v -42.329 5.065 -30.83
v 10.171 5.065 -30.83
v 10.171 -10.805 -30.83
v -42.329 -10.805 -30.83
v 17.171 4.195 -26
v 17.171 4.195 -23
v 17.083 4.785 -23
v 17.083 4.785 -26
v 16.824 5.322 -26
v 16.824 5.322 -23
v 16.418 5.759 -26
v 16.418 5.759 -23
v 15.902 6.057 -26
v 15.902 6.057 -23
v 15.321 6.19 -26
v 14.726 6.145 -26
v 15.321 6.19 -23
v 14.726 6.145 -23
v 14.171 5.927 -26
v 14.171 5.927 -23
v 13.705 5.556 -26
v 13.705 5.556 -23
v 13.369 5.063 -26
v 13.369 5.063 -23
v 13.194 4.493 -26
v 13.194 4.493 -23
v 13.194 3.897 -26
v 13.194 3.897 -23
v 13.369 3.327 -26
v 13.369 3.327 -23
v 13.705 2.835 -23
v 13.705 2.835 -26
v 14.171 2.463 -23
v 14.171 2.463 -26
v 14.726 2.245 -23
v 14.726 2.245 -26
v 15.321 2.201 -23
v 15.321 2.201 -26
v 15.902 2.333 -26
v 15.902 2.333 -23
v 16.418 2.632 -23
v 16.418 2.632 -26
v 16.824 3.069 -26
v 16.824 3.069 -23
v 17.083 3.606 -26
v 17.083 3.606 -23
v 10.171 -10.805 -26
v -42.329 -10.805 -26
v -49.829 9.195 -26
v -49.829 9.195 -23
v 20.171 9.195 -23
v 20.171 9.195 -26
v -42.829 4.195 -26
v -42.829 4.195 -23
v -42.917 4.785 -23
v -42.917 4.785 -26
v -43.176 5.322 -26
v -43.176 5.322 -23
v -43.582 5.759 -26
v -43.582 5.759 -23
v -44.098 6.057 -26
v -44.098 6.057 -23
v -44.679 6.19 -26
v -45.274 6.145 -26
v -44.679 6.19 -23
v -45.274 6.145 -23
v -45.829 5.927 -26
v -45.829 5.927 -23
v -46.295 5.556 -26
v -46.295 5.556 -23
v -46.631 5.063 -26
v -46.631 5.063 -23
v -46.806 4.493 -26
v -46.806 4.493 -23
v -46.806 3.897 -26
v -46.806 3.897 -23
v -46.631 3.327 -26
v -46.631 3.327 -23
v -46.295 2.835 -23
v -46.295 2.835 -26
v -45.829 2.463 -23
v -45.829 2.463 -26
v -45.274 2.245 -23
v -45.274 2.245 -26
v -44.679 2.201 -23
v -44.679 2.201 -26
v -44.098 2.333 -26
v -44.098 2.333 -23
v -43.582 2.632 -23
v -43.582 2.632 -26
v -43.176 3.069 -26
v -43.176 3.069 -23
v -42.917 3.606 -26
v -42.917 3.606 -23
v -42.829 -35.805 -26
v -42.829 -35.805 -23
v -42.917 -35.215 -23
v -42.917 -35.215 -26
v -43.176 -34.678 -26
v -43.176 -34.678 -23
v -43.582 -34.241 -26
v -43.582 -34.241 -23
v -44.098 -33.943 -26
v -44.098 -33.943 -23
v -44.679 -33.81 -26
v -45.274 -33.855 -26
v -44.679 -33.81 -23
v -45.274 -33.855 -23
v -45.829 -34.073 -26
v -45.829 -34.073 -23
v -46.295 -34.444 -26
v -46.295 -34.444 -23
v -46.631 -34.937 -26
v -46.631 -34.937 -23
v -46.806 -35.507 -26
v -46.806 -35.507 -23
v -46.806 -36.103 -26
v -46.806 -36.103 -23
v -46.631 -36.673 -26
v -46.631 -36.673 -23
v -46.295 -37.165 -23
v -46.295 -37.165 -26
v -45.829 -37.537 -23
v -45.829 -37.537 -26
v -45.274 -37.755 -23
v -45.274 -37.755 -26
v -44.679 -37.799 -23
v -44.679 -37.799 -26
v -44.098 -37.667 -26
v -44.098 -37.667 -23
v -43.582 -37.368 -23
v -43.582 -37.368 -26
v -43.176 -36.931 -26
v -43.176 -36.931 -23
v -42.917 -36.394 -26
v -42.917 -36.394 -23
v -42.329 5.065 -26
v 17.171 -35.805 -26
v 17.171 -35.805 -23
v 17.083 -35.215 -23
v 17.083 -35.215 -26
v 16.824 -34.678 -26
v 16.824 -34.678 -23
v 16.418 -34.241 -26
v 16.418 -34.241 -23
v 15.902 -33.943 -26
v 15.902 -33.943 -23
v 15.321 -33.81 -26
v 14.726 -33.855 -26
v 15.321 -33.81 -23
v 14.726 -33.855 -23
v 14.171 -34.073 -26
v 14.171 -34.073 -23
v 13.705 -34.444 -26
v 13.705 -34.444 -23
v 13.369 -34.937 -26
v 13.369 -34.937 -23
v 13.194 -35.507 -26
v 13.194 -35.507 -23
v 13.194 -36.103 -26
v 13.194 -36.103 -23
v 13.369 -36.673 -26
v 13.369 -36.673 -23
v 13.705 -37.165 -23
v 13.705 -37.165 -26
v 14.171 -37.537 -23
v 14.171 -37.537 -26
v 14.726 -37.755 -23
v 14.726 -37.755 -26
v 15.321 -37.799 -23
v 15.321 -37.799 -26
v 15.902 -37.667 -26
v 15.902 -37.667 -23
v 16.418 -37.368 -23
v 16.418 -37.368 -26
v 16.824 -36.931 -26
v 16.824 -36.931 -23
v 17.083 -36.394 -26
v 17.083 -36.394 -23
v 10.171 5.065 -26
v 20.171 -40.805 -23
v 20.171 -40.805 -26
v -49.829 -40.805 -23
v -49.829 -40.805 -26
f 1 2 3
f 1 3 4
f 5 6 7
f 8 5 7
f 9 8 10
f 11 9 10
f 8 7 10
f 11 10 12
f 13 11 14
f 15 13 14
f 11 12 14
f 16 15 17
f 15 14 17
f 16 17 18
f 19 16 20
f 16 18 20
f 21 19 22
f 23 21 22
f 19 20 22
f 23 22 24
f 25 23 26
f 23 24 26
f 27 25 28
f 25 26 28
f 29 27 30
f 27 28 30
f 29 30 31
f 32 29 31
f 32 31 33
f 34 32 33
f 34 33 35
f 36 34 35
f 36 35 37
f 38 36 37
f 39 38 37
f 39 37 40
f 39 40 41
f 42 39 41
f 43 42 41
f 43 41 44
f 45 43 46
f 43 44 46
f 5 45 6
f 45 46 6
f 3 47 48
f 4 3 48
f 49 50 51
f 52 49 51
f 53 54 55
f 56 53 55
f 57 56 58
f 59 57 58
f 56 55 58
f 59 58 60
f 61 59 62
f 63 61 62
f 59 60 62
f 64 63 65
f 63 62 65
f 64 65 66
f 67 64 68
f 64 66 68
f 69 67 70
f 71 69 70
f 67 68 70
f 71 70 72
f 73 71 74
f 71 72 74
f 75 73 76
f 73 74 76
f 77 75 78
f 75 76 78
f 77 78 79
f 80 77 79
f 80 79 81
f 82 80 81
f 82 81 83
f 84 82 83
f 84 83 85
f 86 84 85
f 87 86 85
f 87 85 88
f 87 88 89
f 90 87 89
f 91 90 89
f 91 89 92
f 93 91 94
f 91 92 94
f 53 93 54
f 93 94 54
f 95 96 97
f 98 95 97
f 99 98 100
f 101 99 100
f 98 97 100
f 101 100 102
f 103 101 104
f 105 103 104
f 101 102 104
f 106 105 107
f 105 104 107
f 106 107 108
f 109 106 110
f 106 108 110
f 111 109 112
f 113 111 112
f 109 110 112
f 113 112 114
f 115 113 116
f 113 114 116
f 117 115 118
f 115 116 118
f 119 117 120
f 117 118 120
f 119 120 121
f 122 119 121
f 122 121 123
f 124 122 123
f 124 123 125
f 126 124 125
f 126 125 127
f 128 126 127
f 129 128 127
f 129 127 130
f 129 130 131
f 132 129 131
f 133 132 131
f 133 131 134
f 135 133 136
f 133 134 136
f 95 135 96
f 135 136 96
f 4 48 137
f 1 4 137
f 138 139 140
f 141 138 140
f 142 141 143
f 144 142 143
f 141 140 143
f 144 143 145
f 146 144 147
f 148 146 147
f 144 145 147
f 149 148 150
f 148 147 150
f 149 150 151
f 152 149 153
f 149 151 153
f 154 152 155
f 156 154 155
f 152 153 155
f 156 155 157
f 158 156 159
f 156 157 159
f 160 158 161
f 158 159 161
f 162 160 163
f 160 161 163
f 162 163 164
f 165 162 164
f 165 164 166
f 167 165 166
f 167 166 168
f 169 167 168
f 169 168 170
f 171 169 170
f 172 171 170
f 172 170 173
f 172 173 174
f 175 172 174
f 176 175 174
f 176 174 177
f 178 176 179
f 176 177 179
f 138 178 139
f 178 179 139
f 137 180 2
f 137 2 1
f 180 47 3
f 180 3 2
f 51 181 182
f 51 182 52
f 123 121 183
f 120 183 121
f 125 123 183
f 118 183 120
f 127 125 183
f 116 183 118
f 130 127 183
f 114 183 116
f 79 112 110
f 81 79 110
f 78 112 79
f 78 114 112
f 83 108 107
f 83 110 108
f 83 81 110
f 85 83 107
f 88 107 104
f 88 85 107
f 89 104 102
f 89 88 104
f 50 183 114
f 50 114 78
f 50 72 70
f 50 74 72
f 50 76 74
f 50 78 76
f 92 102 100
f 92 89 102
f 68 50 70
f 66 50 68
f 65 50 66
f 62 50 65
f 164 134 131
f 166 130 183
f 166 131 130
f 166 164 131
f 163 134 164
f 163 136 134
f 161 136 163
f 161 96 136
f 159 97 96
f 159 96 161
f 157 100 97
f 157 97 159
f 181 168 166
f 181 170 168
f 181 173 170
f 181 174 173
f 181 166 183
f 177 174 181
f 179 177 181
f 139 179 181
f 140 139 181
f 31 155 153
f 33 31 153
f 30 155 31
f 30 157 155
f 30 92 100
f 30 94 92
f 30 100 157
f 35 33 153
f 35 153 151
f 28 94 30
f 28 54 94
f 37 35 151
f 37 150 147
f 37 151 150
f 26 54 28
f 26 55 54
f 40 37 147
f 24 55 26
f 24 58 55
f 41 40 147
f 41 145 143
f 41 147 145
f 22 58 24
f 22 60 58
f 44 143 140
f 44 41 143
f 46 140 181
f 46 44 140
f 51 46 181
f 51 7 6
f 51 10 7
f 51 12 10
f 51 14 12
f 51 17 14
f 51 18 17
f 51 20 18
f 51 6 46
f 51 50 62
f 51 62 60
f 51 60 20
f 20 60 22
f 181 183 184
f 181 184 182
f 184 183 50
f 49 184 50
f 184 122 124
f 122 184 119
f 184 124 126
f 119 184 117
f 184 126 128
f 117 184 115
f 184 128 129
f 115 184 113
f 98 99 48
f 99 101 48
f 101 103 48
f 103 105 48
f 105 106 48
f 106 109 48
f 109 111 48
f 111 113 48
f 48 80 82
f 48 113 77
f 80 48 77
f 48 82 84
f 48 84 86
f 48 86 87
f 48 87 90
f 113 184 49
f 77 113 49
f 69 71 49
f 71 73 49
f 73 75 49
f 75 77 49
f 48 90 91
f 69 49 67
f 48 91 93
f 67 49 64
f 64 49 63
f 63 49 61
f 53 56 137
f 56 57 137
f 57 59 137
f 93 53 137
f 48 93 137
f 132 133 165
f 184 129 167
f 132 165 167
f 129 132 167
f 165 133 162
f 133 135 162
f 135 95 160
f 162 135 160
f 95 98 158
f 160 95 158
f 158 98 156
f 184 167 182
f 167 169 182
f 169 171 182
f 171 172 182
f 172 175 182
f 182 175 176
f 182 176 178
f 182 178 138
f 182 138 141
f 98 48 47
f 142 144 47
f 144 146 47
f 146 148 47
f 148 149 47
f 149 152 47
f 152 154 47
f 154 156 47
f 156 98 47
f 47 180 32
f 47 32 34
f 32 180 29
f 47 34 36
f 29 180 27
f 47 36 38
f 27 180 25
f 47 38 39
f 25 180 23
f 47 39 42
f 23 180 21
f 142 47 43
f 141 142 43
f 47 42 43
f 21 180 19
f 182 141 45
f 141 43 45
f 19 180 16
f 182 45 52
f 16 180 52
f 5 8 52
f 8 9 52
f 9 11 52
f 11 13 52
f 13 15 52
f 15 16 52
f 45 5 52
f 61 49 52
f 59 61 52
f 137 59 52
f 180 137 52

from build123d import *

# Parameters (mm, degrees)
SKETCH1_W           = 70
SKETCH1_H           = 50
SKETCH1_R           = 2
BOSS_EXTRUDE1_DEPTH = 3
SKETCH2_W           = 52.5
SKETCH2_H           = 15.87
BOSS_EXTRUDE2_DEPTH = 4.83


with BuildPart() as part:
    # Sketch1 → Boss-Extrude1 (new body)
    with BuildSketch(Plane.XY.offset(-23)):
        with Locations((-14.828582329, -15.804770786)):
            Rectangle(SKETCH1_W, SKETCH1_H)
        with Locations((15.171417671, -35.804770786)):
            Circle(SKETCH1_R, mode=Mode.SUBTRACT)
        with Locations((-44.828582329, -35.804770786)):
            Circle(SKETCH1_R, mode=Mode.SUBTRACT)
        with Locations((-44.828582329, 4.195229214)):
            Circle(SKETCH1_R, mode=Mode.SUBTRACT)
        with Locations((15.171417671, 4.195229214)):
            Circle(SKETCH1_R, mode=Mode.SUBTRACT)
    extrude(amount=-BOSS_EXTRUDE1_DEPTH)

    # Sketch2 → Boss-Extrude2 (add)
    with BuildSketch(Plane(origin=(0, 0, -26), x_dir=(-1, 0, 0), z_dir=(0, 0, -1))):
        with Locations((16.078582329, -2.869770786)):
            Rectangle(SKETCH2_W, SKETCH2_H)
    extrude(amount=BOSS_EXTRUDE2_DEPTH)


solid = part.part
